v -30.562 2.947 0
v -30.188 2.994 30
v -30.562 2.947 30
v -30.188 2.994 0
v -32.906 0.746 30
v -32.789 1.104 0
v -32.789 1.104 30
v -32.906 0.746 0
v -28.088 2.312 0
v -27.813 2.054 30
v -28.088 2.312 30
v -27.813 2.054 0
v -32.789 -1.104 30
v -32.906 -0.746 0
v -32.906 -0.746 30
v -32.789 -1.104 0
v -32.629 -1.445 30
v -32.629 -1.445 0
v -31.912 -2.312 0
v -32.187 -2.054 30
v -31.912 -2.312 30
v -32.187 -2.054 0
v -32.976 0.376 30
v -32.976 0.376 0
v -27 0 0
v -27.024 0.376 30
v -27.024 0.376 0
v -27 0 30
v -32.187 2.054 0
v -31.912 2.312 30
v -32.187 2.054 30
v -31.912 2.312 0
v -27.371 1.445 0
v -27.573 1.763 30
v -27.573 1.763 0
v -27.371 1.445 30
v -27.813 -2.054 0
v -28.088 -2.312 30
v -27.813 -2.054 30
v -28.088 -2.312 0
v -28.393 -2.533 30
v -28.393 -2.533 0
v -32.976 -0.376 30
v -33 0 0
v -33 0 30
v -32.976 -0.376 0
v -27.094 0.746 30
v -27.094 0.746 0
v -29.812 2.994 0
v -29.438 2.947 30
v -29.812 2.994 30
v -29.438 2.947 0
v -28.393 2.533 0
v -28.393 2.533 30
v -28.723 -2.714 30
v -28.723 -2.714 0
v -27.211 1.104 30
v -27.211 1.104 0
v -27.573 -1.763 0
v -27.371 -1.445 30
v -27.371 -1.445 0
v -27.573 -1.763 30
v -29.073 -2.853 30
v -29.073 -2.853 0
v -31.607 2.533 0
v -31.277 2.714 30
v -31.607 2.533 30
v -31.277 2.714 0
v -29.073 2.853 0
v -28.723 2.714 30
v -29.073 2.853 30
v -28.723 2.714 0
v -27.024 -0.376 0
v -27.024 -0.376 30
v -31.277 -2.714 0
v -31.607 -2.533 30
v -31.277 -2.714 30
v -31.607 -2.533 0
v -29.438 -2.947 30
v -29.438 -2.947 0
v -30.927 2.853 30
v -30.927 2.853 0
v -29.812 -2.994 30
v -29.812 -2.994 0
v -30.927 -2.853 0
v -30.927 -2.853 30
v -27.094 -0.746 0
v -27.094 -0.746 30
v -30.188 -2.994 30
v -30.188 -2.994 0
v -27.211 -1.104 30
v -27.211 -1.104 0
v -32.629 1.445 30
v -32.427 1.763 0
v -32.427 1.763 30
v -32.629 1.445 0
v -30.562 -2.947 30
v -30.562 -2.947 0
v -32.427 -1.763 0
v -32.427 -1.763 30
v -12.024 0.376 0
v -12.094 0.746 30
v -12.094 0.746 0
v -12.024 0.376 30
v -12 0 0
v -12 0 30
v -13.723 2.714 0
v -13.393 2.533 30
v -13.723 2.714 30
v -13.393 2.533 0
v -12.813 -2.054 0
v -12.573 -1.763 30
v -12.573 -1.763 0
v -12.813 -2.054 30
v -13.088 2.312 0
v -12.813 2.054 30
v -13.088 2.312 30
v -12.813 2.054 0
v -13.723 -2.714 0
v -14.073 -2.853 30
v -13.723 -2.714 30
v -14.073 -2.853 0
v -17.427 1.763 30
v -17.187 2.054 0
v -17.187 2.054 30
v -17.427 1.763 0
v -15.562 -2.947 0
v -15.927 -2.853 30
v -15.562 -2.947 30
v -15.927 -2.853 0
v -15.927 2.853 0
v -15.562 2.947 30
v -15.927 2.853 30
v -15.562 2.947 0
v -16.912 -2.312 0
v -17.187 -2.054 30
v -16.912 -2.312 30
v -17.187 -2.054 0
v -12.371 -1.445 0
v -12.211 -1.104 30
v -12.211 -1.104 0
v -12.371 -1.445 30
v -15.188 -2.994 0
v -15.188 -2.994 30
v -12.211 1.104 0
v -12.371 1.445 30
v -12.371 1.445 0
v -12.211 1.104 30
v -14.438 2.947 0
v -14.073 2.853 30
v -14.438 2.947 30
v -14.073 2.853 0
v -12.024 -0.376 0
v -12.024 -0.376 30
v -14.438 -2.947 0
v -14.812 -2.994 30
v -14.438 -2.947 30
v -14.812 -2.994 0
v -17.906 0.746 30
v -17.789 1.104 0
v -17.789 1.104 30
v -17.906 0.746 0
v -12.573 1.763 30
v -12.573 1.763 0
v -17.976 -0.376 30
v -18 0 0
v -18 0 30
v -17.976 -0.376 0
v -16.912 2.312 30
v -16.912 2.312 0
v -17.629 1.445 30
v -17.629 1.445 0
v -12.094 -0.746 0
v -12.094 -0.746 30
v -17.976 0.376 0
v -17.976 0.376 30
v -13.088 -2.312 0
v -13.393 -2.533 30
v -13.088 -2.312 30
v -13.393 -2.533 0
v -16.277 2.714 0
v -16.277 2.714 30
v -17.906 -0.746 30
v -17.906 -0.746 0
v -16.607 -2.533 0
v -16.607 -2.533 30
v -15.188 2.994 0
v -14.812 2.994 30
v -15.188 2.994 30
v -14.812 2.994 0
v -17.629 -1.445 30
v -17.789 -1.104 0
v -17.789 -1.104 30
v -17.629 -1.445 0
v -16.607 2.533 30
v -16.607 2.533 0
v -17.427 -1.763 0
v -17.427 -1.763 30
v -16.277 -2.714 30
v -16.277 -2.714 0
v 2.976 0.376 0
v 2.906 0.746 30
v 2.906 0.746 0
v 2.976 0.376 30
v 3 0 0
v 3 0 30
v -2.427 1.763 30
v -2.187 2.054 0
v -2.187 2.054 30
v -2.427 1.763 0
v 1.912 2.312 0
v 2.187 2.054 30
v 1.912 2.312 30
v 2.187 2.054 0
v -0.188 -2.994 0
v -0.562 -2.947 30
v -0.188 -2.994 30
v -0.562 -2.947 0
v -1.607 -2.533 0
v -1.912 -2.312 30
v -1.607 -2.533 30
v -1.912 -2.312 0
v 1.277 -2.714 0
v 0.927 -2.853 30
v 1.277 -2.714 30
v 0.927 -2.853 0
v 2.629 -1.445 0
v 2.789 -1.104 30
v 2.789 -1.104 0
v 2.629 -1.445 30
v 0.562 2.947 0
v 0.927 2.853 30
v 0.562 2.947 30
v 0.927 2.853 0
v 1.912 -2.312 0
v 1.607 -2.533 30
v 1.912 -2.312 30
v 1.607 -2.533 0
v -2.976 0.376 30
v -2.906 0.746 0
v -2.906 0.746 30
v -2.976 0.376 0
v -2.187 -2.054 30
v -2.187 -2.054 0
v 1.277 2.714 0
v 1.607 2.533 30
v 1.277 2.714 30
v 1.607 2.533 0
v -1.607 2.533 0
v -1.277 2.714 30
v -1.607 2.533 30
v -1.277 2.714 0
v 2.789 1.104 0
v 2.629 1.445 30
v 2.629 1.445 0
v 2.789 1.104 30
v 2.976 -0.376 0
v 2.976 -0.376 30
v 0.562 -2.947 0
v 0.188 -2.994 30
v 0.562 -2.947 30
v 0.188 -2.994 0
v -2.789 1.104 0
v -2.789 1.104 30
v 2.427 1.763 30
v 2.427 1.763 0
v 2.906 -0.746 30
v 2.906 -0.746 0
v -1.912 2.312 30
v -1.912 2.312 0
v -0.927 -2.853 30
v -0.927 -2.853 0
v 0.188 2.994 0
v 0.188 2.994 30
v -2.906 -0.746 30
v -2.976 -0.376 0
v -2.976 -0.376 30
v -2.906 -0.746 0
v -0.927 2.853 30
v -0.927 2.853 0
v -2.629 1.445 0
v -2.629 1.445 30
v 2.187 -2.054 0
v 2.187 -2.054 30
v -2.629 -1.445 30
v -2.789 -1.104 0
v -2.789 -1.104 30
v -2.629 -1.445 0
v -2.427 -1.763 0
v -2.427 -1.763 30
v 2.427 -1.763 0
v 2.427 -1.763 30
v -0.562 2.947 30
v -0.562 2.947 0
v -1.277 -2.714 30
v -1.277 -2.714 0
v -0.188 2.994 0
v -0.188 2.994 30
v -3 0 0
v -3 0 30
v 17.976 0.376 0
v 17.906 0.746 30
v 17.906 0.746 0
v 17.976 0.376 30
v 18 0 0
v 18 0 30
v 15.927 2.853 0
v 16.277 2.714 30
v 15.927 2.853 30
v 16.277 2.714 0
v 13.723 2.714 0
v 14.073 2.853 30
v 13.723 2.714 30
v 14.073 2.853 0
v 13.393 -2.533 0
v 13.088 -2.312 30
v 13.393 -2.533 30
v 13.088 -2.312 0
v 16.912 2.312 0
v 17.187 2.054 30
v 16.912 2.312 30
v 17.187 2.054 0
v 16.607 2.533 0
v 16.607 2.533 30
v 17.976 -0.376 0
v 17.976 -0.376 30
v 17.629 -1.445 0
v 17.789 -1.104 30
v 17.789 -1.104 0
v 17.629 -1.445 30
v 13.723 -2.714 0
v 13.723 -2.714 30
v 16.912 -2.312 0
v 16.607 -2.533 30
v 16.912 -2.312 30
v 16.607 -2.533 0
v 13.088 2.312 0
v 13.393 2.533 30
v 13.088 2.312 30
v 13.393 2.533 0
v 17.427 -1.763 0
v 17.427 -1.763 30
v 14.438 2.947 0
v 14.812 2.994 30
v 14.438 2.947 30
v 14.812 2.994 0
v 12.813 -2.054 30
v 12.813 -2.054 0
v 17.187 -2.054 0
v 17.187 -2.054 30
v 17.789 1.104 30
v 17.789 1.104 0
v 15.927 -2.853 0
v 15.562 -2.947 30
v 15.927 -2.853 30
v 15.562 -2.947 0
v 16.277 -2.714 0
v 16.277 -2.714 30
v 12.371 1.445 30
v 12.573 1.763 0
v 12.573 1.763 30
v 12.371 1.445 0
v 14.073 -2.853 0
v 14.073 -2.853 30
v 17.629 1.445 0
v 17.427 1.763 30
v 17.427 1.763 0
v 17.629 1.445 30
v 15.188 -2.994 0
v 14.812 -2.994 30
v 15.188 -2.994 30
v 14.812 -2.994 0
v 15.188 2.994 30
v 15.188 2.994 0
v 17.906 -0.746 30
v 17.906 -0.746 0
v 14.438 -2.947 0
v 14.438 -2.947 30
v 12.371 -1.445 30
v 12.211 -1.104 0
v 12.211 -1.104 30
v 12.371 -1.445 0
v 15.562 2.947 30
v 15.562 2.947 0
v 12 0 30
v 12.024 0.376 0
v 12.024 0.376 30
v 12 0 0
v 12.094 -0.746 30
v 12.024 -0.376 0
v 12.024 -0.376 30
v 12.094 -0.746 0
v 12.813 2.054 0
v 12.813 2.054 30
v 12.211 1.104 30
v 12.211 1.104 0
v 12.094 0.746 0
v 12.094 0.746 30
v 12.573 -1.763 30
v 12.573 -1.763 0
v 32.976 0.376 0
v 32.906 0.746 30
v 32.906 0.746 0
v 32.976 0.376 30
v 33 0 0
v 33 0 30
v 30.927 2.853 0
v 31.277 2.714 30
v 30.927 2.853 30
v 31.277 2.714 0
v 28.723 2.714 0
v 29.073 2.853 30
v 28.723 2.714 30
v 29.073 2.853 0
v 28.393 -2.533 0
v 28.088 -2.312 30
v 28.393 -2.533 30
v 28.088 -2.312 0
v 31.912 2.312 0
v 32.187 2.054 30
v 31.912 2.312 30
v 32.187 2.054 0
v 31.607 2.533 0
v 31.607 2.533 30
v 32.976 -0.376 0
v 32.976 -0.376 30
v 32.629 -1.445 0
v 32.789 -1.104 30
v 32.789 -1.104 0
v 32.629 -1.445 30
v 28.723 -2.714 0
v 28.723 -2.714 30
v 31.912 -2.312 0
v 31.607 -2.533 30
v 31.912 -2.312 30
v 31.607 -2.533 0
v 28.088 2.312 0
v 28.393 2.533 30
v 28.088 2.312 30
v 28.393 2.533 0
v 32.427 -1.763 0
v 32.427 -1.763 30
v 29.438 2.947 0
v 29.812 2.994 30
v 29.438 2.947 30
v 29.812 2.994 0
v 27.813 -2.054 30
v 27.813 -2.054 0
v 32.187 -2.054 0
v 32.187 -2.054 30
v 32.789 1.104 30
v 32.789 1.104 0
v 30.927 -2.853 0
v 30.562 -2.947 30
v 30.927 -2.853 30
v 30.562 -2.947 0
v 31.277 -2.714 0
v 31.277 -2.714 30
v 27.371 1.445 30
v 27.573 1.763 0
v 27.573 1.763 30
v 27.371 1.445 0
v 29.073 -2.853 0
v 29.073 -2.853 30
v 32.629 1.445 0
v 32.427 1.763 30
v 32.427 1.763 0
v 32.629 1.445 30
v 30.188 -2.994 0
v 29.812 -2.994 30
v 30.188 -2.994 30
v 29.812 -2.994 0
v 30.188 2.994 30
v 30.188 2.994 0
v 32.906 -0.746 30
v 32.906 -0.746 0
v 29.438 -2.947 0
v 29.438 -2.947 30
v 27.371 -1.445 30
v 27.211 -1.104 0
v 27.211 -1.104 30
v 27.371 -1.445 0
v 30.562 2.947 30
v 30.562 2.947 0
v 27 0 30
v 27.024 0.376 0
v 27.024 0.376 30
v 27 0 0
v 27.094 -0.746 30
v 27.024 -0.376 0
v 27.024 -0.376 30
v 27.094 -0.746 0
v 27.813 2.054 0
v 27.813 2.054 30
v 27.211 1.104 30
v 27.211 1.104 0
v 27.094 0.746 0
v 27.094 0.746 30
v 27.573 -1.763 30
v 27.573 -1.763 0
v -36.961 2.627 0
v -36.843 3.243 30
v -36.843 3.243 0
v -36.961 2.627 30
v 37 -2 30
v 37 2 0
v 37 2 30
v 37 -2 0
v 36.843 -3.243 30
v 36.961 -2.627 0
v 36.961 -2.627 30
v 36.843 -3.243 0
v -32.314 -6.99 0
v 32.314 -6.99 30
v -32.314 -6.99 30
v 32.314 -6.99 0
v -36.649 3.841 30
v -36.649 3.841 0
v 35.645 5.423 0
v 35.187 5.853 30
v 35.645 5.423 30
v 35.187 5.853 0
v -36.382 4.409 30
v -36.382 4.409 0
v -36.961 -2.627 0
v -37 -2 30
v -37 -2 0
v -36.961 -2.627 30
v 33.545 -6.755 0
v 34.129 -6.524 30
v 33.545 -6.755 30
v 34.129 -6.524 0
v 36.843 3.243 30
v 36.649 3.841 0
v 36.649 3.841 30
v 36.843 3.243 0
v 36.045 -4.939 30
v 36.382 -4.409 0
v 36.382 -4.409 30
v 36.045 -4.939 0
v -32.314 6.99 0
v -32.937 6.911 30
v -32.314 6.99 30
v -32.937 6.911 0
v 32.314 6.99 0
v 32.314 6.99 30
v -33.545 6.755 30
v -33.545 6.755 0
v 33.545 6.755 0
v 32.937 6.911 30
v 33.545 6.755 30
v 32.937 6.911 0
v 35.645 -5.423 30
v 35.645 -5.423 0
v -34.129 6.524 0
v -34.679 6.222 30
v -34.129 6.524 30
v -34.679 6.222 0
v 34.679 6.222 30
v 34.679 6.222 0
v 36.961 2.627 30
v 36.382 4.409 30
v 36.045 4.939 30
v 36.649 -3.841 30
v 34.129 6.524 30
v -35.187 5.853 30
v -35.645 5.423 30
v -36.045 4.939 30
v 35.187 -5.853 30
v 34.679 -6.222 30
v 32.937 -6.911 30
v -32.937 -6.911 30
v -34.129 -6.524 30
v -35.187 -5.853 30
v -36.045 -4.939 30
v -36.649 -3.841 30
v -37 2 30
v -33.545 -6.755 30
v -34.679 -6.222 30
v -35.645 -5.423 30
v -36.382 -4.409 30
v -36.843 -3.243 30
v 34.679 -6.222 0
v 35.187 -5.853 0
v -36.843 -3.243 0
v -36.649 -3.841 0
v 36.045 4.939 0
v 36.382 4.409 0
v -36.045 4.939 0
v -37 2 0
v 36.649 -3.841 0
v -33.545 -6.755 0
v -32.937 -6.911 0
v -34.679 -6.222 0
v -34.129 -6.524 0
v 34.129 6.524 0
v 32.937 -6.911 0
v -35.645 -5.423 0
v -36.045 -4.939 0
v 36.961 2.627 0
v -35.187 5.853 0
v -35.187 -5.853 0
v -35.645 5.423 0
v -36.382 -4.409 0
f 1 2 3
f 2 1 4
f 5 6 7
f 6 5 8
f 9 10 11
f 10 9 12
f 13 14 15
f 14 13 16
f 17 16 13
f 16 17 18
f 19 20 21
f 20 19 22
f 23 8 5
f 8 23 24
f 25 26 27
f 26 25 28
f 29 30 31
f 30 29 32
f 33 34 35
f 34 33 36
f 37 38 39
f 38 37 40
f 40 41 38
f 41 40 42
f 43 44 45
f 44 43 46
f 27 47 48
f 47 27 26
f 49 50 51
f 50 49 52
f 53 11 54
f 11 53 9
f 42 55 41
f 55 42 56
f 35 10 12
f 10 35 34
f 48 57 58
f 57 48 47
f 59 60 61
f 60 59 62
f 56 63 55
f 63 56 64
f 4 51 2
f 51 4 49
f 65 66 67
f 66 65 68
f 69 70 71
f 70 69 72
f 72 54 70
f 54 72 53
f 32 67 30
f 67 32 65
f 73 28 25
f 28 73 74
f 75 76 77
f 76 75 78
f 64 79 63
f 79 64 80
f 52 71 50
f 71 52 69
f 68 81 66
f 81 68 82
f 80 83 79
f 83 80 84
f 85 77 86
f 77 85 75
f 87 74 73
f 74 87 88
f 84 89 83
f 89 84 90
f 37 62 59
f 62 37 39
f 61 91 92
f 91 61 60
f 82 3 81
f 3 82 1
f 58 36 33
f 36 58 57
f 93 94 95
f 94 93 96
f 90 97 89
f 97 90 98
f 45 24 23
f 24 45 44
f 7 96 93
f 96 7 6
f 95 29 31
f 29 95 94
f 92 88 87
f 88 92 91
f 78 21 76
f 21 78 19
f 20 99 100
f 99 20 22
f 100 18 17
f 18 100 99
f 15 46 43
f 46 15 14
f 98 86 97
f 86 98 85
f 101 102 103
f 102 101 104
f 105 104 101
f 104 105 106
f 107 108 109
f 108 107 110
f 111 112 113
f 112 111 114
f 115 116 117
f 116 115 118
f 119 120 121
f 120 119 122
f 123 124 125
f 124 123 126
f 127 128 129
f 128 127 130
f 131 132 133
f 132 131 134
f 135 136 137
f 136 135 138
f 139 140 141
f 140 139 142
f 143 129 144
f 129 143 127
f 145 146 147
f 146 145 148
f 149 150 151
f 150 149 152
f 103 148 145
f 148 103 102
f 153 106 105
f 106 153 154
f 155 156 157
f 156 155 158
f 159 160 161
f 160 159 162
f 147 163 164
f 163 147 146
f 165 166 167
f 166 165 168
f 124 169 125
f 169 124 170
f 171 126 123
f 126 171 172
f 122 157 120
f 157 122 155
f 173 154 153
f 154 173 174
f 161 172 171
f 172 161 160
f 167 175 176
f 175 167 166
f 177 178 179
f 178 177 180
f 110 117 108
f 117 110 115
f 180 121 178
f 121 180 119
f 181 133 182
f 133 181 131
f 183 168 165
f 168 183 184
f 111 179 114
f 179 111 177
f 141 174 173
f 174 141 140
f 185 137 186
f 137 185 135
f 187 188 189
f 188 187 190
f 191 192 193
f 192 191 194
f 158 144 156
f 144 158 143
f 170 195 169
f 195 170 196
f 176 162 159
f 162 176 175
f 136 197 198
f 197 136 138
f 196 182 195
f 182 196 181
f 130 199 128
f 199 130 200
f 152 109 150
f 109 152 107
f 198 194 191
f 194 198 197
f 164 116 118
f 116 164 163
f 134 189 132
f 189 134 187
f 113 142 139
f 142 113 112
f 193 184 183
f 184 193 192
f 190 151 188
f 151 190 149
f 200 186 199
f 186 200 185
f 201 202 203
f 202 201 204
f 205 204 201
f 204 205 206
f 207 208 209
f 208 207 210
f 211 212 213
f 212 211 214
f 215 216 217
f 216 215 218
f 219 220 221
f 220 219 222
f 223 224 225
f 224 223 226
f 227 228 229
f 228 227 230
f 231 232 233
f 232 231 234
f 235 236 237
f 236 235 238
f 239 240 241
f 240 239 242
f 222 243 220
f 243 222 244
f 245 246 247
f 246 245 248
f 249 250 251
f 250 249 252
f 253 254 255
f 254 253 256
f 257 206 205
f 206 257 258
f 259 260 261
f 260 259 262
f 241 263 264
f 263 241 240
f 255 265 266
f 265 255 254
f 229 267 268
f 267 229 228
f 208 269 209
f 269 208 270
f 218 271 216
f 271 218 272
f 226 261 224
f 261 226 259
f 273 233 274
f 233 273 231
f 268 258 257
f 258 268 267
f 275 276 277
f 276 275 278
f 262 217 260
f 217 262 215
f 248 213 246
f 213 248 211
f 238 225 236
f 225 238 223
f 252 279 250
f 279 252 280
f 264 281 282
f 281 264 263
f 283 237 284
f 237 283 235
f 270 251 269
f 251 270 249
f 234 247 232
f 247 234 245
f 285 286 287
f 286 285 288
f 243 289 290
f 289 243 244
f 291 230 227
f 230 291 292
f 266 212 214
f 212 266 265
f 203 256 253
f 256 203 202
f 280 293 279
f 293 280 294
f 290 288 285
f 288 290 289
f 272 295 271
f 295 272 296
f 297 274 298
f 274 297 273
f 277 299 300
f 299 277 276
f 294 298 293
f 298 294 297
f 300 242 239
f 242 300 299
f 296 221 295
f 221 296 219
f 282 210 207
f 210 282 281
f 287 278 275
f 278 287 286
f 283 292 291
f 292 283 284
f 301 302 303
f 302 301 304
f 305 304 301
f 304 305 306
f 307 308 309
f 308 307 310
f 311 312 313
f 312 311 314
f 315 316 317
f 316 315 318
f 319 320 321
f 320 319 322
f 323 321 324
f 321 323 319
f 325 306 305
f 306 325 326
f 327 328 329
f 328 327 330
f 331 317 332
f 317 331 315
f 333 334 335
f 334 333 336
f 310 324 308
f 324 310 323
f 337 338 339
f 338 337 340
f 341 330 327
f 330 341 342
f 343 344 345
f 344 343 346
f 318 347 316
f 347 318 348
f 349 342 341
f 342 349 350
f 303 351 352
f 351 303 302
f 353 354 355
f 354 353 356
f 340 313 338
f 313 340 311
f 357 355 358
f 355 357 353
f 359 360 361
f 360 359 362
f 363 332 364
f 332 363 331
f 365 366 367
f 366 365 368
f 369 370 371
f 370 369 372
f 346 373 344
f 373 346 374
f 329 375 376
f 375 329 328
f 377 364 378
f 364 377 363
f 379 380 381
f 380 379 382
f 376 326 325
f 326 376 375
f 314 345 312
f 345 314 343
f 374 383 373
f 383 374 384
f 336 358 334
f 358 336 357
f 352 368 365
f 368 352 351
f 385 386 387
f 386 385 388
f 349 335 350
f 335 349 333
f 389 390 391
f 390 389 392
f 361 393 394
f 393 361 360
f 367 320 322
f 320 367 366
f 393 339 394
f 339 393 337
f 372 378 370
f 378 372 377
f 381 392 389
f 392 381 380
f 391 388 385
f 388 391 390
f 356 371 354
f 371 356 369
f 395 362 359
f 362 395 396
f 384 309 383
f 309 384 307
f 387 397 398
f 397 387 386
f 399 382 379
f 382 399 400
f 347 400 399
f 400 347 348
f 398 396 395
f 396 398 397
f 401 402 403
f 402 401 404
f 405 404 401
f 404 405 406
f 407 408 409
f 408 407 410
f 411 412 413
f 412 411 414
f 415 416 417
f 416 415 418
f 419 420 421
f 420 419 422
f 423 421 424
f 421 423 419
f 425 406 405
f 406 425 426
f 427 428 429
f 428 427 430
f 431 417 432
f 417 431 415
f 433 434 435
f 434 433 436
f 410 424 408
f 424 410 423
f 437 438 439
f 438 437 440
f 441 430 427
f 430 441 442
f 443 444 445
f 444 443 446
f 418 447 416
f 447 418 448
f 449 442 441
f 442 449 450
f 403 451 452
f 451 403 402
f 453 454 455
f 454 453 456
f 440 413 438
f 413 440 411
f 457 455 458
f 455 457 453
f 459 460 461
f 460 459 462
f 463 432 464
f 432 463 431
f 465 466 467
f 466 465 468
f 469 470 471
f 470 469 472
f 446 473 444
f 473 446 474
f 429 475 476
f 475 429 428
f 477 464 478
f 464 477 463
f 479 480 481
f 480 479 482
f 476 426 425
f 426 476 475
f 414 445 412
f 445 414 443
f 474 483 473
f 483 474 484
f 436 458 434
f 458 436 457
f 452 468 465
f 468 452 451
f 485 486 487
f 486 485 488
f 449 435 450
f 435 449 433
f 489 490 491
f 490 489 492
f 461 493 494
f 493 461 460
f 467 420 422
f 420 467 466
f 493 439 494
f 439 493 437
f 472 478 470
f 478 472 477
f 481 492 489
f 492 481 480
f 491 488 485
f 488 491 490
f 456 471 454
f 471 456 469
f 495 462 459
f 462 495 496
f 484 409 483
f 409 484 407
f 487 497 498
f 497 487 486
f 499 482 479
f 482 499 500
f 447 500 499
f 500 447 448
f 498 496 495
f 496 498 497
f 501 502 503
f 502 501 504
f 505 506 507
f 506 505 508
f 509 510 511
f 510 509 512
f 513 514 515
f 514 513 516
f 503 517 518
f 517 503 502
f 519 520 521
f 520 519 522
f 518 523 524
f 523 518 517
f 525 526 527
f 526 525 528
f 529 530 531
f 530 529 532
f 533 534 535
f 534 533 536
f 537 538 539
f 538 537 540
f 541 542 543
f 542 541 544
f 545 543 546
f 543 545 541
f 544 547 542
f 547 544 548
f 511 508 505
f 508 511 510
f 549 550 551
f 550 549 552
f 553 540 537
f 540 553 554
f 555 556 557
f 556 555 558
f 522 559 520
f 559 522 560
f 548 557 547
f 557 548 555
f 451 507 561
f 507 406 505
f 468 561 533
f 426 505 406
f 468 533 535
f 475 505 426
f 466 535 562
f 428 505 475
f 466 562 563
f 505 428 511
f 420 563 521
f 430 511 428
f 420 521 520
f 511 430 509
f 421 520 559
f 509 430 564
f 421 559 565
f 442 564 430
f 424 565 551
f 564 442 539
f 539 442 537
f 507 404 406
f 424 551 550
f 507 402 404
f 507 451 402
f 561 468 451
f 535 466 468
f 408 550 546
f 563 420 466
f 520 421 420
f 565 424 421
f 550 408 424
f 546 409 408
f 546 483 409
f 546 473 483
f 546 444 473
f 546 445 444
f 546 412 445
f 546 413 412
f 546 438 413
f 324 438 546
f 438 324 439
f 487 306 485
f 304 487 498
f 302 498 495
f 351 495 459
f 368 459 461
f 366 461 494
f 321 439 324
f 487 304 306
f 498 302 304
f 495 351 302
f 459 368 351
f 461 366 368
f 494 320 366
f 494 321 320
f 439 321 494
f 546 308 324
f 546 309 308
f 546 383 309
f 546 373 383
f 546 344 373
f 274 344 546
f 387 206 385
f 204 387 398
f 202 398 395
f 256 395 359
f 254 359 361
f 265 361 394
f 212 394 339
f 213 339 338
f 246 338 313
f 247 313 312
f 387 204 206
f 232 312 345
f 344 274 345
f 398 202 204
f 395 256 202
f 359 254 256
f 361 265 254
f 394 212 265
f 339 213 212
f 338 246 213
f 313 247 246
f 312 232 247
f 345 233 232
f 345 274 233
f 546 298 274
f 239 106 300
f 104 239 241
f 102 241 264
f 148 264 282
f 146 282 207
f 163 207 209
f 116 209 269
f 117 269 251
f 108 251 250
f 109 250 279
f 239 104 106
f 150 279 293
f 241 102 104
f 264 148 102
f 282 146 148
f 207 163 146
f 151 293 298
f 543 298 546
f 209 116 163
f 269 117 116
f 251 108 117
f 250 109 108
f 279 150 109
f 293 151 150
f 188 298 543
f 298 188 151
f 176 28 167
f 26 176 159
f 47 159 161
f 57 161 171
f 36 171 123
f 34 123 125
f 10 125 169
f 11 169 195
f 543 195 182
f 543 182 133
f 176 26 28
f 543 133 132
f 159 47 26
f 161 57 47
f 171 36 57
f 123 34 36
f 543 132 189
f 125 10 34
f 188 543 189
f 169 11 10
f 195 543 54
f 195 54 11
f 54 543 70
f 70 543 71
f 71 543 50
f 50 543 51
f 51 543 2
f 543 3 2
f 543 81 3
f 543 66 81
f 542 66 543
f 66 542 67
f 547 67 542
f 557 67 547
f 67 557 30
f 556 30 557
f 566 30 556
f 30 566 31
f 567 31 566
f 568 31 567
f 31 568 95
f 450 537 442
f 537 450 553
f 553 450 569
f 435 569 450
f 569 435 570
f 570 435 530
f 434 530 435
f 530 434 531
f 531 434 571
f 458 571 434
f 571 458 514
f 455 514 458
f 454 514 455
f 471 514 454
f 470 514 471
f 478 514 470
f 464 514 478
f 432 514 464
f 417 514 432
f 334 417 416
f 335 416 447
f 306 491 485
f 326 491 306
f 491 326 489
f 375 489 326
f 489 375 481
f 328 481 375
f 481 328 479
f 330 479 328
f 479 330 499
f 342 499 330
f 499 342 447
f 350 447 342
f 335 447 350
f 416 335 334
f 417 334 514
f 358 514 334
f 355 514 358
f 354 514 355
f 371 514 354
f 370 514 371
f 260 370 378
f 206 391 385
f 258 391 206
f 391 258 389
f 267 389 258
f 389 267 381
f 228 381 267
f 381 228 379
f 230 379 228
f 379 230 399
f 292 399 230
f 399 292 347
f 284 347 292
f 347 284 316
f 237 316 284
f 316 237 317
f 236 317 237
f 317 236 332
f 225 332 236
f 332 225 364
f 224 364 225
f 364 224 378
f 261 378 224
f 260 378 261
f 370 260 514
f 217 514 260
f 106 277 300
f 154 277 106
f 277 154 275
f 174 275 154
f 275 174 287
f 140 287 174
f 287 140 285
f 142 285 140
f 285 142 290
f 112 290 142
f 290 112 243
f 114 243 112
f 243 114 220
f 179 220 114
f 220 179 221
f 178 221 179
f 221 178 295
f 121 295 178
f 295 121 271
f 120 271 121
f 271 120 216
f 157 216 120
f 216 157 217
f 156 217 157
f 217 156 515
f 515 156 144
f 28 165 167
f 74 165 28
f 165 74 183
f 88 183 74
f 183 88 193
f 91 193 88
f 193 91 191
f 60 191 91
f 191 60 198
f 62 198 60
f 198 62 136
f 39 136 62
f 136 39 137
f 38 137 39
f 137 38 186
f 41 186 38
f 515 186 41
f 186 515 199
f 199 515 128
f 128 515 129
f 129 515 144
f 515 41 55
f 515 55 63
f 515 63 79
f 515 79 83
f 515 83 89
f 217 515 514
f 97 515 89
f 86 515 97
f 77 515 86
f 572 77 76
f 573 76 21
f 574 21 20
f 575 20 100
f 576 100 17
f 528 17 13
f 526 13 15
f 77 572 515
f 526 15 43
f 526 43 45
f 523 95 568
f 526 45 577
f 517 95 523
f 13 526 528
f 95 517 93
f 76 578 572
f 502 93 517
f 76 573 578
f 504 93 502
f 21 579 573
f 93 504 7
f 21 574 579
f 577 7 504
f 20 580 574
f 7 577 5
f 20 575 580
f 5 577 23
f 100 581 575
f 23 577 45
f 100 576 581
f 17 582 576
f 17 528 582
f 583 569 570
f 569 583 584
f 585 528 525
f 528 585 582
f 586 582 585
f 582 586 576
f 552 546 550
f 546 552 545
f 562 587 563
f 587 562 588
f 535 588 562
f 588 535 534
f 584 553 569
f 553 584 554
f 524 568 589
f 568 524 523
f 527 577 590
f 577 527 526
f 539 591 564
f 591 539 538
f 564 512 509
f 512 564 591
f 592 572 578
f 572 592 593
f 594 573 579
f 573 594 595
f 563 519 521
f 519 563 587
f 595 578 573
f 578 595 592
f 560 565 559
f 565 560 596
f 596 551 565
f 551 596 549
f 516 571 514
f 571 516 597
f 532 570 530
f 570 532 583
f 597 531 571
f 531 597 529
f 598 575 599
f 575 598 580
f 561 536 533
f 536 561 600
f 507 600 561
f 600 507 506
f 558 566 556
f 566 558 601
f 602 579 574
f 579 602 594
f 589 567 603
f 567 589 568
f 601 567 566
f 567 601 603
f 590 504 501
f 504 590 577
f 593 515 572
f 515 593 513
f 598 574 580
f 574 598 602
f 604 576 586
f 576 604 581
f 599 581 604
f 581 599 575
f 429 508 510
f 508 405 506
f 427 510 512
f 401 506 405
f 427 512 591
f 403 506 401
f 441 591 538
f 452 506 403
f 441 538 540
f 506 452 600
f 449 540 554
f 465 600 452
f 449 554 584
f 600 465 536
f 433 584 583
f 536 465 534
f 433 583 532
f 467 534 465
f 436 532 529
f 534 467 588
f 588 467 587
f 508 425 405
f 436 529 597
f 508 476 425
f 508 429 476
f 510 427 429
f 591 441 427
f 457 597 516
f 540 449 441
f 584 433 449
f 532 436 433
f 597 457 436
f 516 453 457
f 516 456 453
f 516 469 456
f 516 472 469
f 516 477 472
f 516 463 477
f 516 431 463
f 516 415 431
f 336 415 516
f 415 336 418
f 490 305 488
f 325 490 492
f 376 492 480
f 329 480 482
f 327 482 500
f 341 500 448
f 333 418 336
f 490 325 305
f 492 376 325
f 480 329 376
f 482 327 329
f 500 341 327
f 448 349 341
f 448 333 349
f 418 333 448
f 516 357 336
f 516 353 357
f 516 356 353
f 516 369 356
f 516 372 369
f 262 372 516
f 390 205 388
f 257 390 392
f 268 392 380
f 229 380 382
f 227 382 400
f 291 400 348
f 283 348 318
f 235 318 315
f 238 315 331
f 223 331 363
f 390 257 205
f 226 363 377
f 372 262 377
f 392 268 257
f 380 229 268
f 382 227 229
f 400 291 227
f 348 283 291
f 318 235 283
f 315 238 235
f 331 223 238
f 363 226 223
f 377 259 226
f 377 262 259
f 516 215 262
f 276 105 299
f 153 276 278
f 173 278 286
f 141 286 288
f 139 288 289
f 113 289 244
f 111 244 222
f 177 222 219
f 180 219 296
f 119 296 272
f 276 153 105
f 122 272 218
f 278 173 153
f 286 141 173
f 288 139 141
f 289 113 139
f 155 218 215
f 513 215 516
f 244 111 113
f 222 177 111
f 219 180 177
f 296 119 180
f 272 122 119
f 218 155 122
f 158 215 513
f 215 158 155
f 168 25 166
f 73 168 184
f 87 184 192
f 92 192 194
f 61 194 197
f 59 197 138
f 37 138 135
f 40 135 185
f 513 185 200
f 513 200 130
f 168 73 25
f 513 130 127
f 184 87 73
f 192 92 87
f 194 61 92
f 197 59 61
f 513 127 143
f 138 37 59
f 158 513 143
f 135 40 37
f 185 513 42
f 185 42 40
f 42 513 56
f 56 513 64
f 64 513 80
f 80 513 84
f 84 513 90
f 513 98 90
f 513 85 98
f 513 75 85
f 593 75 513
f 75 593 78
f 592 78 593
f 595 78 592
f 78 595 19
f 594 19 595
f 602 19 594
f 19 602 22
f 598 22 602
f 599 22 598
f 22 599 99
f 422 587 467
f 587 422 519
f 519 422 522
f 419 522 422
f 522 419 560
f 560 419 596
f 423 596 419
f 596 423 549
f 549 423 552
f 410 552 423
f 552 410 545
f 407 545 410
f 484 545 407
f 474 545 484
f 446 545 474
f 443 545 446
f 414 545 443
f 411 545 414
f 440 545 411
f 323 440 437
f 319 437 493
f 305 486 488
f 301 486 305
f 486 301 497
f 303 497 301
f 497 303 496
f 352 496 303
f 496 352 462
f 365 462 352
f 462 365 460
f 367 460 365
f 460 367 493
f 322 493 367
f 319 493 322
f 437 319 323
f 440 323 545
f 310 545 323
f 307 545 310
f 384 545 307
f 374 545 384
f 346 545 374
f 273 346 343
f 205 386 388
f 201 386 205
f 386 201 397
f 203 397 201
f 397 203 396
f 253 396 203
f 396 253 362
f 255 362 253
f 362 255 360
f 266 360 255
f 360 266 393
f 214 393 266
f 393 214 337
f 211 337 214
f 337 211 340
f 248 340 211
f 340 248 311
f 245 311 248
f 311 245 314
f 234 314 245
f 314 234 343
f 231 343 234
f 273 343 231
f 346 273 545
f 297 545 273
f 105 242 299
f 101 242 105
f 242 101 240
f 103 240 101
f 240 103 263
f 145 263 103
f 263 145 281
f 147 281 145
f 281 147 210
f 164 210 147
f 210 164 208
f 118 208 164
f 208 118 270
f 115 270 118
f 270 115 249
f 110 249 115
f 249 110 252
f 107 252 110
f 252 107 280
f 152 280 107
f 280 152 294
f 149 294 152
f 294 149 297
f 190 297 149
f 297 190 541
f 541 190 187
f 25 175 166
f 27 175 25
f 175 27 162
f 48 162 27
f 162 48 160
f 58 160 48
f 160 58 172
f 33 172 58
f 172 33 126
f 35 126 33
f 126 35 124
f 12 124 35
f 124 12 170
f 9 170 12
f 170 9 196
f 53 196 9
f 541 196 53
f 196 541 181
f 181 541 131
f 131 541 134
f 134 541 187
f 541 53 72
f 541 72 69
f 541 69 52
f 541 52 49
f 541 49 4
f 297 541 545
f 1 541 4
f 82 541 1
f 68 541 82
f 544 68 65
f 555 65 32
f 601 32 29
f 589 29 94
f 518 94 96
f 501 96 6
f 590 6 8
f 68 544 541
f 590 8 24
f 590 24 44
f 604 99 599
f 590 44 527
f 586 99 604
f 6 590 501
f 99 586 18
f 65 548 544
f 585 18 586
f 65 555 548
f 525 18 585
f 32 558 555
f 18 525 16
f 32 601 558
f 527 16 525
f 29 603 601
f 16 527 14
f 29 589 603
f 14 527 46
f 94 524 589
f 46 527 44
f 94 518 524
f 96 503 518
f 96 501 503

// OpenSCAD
$fn = 50;


difference() {
	union() {
		hull() {
			translate(v = [-32.0000000000, 2.0000000000, 0]) {
				cylinder(h = 30, r = 5);
			}
			translate(v = [32.0000000000, 2.0000000000, 0]) {
				cylinder(h = 30, r = 5);
			}
			translate(v = [-32.0000000000, -2.0000000000, 0]) {
				cylinder(h = 30, r = 5);
			}
			translate(v = [32.0000000000, -2.0000000000, 0]) {
				cylinder(h = 30, r = 5);
			}
		}
	}
	union() {
		translate(v = [-30.0000000000, 0.0000000000, 0]) {
			translate(v = [0, 0, -100]) {
				cylinder(h = 200, r = 3.0000000000);
			}
		}
		translate(v = [-15.0000000000, 0.0000000000, 0]) {
			translate(v = [0, 0, -100]) {
				cylinder(h = 200, r = 3.0000000000);
			}
		}
		translate(v = [0, 0, -100]) {
			cylinder(h = 200, r = 3.0000000000);
		}
		translate(v = [15.0000000000, 0.0000000000, 0]) {
			translate(v = [0, 0, -100]) {
				cylinder(h = 200, r = 3.0000000000);
			}
		}
		translate(v = [30.0000000000, 0.0000000000, 0]) {
			translate(v = [0, 0, -100]) {
				cylinder(h = 200, r = 3.0000000000);
			}
		}
	}
}
